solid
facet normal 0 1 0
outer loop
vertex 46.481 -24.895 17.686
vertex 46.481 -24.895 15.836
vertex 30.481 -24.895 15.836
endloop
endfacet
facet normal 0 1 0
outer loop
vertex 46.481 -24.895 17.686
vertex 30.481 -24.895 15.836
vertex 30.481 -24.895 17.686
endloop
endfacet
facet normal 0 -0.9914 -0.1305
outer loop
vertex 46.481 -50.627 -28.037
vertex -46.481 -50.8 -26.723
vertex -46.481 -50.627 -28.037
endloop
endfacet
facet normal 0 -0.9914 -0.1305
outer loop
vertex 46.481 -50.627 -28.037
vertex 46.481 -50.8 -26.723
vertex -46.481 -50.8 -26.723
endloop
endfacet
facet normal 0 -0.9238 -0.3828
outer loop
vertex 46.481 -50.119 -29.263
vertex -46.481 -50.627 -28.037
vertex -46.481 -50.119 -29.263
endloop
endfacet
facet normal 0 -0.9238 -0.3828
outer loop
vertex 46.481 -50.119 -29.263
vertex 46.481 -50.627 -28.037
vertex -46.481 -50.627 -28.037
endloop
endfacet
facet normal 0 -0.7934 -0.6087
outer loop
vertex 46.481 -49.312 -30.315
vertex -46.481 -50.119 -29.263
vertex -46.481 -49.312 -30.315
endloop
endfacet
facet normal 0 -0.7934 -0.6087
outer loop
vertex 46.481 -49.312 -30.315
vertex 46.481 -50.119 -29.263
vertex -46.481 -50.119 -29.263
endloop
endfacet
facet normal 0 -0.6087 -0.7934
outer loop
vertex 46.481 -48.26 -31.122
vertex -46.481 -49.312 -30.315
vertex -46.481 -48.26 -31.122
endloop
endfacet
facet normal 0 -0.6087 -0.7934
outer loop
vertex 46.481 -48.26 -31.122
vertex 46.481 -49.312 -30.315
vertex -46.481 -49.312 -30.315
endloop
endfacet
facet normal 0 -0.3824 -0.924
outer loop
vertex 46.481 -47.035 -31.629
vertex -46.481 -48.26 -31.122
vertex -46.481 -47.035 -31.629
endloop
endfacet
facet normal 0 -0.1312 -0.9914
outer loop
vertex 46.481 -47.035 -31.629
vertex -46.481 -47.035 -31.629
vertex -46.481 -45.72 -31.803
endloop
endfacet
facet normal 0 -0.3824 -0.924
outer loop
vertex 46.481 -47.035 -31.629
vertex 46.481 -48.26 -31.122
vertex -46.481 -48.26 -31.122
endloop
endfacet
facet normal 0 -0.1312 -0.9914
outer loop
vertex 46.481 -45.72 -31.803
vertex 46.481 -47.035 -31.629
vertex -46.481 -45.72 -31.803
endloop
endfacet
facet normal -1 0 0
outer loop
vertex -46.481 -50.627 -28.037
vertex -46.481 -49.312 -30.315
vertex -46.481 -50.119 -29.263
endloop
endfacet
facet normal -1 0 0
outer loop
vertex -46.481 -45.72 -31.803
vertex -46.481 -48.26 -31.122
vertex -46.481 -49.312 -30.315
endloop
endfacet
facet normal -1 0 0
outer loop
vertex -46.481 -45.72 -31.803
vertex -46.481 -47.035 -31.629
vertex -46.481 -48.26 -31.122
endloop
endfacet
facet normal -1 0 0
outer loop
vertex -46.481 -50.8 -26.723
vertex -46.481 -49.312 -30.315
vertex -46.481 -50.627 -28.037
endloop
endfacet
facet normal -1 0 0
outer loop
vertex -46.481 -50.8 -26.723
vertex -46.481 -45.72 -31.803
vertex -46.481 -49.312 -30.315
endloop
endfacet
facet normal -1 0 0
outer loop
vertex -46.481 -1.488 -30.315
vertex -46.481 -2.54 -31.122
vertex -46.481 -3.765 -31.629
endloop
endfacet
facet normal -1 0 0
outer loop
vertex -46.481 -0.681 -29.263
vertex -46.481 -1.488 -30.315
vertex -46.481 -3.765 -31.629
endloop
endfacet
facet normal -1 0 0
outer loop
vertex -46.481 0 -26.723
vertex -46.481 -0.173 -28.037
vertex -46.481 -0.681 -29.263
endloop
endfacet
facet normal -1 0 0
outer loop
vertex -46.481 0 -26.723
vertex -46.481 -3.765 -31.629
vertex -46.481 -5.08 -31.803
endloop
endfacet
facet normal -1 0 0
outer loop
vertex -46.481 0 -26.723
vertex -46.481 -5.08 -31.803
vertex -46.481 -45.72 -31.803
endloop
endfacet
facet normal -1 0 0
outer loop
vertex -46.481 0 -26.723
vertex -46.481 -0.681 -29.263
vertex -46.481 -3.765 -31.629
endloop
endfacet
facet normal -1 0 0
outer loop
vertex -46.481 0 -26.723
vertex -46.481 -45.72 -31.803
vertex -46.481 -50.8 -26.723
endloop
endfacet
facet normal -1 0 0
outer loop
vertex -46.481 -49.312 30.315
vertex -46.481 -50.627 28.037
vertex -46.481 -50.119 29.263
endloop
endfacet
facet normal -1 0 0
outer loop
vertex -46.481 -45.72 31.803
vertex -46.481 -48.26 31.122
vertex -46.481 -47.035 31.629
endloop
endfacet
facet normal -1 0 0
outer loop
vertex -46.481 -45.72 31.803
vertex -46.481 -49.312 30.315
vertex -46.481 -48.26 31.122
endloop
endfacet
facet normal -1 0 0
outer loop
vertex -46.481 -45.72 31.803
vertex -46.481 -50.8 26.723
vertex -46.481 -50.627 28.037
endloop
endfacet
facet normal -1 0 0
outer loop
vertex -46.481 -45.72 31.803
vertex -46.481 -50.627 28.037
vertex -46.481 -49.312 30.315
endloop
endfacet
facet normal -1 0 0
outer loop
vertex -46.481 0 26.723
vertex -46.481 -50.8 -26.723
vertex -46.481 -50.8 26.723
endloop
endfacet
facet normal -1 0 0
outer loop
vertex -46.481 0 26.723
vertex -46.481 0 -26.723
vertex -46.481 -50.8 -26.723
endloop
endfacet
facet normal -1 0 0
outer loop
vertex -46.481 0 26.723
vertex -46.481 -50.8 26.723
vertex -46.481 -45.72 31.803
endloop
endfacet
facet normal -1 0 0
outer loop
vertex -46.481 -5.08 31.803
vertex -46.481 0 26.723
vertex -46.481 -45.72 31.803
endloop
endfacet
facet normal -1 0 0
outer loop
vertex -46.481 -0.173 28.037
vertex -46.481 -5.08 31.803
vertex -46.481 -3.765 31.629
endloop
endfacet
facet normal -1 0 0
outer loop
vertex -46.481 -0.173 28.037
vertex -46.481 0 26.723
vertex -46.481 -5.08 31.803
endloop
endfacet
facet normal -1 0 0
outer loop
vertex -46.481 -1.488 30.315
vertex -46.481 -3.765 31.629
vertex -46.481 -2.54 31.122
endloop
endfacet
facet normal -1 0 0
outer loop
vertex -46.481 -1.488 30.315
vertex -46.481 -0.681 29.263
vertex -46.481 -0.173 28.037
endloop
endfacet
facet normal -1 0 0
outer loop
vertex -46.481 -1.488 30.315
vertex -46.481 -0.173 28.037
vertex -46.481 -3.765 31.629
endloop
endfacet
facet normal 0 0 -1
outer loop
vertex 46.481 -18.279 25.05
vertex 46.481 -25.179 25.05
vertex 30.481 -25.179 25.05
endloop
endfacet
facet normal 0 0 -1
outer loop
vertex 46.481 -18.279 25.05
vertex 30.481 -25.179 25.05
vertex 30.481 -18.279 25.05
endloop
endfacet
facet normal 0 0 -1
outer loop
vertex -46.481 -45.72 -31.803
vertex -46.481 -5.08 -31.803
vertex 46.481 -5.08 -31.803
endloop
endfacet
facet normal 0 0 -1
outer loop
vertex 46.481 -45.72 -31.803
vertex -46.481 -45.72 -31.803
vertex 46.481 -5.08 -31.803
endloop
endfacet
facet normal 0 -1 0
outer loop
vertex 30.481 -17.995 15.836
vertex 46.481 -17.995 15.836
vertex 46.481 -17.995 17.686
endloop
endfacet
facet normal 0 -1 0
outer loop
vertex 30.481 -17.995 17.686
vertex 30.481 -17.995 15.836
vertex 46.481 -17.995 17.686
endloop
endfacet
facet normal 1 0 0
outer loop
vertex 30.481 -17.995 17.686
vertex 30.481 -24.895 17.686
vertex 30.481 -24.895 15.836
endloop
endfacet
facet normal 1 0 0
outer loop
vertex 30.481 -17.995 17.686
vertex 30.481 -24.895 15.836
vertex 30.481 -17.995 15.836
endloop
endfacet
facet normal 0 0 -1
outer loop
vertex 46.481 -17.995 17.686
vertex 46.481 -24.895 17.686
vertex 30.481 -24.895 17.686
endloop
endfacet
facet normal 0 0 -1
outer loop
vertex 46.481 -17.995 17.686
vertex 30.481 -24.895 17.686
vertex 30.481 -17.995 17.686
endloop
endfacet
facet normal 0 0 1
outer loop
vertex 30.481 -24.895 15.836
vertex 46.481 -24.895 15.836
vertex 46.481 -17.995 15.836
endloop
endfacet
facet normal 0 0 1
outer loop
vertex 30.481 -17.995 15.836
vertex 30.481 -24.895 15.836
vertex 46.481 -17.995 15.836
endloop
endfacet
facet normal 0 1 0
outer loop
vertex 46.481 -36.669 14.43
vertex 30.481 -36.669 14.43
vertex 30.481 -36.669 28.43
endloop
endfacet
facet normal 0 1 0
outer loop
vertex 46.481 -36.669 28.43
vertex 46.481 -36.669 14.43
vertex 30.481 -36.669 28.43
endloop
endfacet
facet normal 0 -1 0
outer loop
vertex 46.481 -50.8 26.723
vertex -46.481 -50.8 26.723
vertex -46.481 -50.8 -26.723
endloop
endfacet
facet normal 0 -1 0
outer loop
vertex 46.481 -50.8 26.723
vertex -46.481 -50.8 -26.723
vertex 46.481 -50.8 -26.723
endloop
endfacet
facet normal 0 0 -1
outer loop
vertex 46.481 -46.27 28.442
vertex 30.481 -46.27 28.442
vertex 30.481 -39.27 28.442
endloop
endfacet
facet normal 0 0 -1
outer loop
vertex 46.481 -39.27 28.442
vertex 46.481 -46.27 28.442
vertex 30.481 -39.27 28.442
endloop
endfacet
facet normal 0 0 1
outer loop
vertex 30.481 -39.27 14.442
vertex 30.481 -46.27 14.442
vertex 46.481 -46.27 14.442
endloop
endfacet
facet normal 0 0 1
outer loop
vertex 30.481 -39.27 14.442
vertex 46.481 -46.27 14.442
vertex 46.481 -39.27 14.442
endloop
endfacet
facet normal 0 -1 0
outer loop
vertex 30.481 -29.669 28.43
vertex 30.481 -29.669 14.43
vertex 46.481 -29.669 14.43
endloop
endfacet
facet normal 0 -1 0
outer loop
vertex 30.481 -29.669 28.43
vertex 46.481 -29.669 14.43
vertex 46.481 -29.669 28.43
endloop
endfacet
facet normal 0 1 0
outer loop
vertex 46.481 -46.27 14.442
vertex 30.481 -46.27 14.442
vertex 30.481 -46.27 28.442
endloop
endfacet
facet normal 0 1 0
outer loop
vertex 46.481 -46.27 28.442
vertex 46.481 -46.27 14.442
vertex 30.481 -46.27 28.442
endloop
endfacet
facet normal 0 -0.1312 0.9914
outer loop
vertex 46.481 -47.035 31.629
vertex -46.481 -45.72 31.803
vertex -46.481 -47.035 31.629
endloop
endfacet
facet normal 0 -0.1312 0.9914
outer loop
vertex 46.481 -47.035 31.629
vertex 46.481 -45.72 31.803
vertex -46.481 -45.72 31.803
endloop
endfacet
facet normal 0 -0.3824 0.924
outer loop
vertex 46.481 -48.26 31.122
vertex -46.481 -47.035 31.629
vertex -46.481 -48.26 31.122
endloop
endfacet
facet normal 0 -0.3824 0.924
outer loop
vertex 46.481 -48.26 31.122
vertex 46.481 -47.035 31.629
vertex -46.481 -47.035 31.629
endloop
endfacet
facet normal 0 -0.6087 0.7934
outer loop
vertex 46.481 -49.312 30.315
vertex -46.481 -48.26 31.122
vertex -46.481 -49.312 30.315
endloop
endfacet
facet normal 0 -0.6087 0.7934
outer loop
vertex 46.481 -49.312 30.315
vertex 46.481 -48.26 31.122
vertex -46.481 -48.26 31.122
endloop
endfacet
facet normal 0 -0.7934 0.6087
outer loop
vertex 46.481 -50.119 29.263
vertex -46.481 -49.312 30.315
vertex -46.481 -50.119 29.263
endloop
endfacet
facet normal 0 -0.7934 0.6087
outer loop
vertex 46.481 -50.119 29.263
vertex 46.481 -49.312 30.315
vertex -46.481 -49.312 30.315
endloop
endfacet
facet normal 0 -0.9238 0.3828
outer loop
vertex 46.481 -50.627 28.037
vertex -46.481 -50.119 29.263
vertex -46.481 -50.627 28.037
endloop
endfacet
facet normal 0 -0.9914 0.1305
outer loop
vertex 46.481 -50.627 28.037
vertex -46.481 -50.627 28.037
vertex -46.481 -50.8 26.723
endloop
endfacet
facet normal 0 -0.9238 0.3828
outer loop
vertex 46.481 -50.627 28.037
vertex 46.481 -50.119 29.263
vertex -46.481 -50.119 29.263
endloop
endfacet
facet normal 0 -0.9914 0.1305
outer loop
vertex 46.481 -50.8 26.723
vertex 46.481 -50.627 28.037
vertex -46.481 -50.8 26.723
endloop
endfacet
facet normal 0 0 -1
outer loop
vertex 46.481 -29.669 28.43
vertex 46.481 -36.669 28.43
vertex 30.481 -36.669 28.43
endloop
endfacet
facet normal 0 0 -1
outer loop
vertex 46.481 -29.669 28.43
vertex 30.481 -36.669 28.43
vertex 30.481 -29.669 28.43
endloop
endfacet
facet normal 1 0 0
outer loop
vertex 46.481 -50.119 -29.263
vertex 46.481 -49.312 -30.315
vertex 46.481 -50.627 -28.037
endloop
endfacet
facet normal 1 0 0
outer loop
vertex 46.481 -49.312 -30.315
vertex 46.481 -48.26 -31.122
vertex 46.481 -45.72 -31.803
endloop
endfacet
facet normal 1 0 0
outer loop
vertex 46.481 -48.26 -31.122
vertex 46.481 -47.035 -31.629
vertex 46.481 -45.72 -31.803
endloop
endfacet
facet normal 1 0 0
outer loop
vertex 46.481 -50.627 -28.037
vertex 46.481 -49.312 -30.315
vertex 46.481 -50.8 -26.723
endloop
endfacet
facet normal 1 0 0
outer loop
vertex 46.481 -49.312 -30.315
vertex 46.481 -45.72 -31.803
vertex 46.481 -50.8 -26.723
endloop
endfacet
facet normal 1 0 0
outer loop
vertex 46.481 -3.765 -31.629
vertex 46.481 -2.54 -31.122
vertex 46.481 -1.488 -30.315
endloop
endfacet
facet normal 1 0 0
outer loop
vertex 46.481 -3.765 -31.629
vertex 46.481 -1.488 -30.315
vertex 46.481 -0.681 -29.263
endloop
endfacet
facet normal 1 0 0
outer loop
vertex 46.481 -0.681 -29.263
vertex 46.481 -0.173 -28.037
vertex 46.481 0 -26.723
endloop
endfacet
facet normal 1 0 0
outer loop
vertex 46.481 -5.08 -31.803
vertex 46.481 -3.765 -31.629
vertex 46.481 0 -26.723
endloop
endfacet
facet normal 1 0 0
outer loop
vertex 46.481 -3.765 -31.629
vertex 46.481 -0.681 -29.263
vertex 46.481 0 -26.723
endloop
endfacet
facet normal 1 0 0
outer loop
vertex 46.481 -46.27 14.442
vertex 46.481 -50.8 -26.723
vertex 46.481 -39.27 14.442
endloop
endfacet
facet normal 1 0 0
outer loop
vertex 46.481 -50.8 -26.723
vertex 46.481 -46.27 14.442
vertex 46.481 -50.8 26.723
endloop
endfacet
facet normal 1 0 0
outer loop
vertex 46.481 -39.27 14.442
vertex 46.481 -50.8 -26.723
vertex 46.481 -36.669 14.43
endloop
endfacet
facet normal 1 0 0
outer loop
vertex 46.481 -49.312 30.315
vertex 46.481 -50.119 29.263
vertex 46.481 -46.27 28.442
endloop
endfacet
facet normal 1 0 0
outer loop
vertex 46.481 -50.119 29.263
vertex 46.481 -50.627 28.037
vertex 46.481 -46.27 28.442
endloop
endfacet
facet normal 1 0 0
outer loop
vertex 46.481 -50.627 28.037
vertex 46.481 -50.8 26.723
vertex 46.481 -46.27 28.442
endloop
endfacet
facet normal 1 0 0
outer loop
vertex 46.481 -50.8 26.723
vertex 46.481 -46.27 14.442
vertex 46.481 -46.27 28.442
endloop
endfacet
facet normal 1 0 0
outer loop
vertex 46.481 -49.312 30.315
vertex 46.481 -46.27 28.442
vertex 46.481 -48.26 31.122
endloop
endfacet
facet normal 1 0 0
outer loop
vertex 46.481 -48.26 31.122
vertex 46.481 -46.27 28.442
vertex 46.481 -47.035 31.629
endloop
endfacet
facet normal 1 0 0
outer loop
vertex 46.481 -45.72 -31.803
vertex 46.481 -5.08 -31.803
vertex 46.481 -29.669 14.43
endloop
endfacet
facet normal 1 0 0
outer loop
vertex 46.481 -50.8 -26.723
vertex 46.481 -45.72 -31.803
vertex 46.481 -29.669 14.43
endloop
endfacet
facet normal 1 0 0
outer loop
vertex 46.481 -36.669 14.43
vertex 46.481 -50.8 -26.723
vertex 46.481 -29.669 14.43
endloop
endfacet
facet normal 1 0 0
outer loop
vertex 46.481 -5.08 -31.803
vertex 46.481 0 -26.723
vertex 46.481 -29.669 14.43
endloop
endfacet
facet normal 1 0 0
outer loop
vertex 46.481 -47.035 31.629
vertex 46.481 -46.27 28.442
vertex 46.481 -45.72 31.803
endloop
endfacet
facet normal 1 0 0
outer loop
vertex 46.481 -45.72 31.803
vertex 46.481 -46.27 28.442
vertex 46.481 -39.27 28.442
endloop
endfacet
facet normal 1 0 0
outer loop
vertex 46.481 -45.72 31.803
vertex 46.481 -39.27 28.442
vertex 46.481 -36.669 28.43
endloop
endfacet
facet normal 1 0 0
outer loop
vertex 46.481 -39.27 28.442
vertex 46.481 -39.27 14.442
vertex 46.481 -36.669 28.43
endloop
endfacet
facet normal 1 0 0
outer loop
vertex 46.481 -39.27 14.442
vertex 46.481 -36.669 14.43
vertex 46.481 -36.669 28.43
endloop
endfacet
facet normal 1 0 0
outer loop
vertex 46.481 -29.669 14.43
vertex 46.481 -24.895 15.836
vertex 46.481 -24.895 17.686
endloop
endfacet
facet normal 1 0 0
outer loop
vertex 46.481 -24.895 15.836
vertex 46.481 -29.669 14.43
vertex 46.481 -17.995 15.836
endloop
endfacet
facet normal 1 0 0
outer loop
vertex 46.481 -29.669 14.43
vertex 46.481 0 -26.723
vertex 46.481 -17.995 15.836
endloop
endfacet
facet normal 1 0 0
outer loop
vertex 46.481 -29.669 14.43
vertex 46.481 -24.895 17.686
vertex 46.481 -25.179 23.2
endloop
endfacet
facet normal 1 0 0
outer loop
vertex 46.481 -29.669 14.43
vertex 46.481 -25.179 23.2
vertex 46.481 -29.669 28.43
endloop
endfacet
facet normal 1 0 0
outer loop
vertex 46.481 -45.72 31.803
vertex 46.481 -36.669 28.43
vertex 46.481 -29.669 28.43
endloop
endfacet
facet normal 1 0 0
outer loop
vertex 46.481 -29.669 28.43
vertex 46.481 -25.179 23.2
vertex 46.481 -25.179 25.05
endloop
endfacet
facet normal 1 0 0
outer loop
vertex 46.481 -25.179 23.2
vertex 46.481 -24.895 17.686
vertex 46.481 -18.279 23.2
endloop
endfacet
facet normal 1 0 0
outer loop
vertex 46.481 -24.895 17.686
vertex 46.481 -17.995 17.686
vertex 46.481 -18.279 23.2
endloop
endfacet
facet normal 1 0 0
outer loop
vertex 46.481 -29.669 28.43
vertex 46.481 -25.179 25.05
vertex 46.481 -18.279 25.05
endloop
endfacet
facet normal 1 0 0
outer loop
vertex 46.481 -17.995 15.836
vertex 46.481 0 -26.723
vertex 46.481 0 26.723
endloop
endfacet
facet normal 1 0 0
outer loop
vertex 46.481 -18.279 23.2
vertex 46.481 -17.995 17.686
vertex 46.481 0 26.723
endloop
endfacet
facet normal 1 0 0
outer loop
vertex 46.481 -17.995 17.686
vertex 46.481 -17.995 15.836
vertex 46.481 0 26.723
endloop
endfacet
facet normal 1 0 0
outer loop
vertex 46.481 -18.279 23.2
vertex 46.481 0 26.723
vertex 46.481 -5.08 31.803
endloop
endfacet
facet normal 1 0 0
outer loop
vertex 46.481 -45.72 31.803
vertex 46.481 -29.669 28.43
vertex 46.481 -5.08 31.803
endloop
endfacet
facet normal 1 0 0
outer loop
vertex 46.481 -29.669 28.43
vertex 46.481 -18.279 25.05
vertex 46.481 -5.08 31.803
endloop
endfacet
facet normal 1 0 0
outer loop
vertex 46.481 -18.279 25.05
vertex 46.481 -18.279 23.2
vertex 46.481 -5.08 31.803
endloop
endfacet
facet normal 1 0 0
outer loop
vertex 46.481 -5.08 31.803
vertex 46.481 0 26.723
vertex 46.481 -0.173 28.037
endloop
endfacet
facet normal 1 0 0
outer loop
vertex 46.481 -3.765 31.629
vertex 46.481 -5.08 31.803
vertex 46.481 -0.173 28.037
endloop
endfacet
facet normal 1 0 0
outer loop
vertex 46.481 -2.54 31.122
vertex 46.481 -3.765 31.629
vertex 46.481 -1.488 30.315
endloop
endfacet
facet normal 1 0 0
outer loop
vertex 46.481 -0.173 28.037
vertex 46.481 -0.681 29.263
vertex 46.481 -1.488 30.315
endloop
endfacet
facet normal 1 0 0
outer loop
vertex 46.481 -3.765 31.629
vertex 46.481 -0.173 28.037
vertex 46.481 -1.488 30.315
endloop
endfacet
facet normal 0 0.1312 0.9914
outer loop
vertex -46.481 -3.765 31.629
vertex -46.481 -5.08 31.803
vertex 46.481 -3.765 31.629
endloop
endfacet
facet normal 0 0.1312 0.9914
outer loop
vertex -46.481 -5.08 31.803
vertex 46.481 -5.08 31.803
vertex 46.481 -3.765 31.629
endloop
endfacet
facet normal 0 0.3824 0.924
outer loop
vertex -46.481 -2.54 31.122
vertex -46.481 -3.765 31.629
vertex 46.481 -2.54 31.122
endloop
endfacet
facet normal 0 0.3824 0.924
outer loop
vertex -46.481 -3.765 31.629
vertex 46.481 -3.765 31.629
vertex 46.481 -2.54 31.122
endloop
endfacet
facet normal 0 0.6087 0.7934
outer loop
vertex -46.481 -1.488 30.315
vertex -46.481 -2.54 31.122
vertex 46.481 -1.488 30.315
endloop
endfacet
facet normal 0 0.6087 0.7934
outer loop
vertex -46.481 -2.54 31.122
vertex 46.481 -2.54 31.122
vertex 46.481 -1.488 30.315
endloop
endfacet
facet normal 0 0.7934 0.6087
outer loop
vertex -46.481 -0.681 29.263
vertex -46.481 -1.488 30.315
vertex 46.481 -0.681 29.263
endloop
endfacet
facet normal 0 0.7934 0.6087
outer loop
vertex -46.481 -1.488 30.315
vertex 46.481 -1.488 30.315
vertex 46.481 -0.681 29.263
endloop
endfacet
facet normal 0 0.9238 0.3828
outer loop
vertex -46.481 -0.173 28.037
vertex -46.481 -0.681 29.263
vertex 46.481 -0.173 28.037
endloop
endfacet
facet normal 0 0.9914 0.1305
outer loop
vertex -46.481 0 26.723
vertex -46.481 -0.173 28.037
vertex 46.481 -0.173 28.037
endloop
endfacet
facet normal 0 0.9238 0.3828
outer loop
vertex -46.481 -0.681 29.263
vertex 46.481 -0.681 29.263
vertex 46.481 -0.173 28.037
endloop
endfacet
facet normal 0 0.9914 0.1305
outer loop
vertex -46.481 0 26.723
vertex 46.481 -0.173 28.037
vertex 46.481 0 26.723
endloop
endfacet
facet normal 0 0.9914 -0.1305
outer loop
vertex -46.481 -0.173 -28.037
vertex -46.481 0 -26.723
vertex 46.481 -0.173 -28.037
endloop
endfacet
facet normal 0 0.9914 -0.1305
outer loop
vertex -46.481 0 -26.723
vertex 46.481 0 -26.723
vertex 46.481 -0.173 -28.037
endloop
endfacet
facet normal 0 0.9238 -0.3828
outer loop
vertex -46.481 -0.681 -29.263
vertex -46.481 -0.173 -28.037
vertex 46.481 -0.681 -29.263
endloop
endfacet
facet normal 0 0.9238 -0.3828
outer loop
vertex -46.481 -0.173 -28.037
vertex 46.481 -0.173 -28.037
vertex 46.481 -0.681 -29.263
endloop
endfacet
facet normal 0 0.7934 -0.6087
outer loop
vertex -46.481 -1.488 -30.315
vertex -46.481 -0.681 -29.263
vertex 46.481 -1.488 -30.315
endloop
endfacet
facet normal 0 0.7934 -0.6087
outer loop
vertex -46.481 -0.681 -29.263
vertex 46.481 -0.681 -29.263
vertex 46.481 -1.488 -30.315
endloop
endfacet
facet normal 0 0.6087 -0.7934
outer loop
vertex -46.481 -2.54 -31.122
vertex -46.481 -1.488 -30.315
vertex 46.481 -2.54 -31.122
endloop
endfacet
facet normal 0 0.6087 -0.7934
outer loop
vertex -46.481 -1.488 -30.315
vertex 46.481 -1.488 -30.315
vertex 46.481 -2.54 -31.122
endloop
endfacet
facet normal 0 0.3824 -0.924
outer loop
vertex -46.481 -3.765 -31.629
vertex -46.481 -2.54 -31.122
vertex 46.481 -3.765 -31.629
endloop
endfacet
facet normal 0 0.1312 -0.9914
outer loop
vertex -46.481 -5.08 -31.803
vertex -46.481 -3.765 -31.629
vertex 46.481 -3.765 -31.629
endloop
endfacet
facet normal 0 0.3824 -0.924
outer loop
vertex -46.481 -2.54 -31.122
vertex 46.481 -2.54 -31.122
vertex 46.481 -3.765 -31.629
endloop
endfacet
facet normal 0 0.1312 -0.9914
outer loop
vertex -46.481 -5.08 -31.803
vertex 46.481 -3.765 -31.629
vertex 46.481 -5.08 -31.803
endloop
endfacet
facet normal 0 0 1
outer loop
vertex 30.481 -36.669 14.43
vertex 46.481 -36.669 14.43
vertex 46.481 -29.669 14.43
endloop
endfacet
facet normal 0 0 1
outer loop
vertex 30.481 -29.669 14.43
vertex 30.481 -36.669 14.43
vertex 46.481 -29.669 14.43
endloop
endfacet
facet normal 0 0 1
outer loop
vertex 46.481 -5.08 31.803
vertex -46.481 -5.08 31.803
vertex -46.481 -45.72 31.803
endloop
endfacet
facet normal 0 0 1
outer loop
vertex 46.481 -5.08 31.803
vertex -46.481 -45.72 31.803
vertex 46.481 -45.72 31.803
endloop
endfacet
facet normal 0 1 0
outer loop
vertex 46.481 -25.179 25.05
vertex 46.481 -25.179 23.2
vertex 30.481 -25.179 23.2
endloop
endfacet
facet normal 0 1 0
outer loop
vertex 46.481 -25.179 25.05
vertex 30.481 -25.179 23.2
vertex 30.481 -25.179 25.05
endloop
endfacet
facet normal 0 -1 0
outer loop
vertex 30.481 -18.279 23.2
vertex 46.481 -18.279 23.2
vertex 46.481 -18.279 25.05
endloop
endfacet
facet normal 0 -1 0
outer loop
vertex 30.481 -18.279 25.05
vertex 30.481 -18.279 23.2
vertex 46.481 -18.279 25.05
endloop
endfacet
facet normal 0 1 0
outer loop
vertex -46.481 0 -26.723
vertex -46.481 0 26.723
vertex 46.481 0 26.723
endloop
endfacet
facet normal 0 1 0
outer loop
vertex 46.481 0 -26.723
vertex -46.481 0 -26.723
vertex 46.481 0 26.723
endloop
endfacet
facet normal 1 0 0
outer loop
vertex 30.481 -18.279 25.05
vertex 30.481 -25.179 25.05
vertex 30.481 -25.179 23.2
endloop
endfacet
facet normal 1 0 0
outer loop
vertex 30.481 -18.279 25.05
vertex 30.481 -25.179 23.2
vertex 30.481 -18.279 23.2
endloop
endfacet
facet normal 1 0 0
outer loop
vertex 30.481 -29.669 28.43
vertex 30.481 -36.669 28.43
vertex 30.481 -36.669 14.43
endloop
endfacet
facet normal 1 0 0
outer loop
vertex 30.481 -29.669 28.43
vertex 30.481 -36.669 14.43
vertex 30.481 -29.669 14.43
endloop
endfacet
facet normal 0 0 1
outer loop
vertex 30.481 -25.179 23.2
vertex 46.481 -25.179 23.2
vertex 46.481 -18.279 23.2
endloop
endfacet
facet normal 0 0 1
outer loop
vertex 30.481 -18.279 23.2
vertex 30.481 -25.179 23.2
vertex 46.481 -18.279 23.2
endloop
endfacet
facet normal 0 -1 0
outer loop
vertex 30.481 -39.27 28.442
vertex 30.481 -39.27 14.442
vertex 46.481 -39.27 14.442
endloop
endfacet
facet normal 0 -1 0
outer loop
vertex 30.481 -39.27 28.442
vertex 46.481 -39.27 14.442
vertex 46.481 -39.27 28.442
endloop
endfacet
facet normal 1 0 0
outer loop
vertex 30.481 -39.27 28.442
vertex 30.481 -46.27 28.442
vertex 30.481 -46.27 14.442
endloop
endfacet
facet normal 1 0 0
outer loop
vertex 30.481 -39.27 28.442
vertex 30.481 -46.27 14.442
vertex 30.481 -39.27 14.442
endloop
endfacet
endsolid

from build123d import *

# Parameters (mm, degrees)
F0_W      = 92.96126
F0_H      = 63.60507
F1_DEPTH  = 50.8
F4_R      = 5.08
F5_R      = 5.08
F6_R      = 5.08
F7_W      = 7
F7_H      = 14
F8_DEPTH  = 16
F9_W      = 7
F9_H      = 14
F10_DEPTH = 16
F11_W     = 6.9
F11_H     = 1.85
F12_DEPTH = 16


with BuildPart() as f1:
    # F0 (on Front) → F1 (new body)
    with BuildSketch(Plane.XZ):
        Rectangle(F0_W, F0_H)
    extrude(amount=F1_DEPTH)

    # F4
    f4_edges = [f1.edges().sort_by_distance(p)[0] for p in [
        (0, -50.8, 31.802535),
    ]]
    fillet(f4_edges, radius=F4_R)

    # F5
    f5_edges = [f1.edges().sort_by_distance(p)[0] for p in [
        (0, 0, 31.802535),
    ]]
    fillet(f5_edges, radius=F5_R)

    # F6
    f6_edges = [f1.edges().sort_by_distance(p)[0] for p in [
        (0, -50.8, -31.802535),
        (0, 0, -31.802535),
    ]]
    fillet(f6_edges, radius=F6_R)

    # F7 (on face) → F8 (cut)
    with BuildSketch(Plane.YZ.offset(46.48063)):
        with Locations((-42.770251, 21.441529)):
            Rectangle(F7_W, F7_H)
    extrude(amount=-F8_DEPTH, mode=Mode.SUBTRACT)

    # F9 (on face) → F10 (cut)
    with BuildSketch(Plane.YZ.offset(46.48063)):
        with Locations((-33.1692, 21.429915)):
            Rectangle(F9_W, F9_H)
    extrude(amount=-F10_DEPTH, mode=Mode.SUBTRACT)

    # F11 (on face) → F12 (cut)
    with BuildSketch(Plane.YZ.offset(46.48063)):
        with Locations((-21.729334, 24.124714)):
            Rectangle(F11_W, F11_H)
        with Locations((-21.445199, 16.760846)):
            Rectangle(F11_W, F11_H)
    extrude(amount=-F12_DEPTH, mode=Mode.SUBTRACT)


solid = f1.part
